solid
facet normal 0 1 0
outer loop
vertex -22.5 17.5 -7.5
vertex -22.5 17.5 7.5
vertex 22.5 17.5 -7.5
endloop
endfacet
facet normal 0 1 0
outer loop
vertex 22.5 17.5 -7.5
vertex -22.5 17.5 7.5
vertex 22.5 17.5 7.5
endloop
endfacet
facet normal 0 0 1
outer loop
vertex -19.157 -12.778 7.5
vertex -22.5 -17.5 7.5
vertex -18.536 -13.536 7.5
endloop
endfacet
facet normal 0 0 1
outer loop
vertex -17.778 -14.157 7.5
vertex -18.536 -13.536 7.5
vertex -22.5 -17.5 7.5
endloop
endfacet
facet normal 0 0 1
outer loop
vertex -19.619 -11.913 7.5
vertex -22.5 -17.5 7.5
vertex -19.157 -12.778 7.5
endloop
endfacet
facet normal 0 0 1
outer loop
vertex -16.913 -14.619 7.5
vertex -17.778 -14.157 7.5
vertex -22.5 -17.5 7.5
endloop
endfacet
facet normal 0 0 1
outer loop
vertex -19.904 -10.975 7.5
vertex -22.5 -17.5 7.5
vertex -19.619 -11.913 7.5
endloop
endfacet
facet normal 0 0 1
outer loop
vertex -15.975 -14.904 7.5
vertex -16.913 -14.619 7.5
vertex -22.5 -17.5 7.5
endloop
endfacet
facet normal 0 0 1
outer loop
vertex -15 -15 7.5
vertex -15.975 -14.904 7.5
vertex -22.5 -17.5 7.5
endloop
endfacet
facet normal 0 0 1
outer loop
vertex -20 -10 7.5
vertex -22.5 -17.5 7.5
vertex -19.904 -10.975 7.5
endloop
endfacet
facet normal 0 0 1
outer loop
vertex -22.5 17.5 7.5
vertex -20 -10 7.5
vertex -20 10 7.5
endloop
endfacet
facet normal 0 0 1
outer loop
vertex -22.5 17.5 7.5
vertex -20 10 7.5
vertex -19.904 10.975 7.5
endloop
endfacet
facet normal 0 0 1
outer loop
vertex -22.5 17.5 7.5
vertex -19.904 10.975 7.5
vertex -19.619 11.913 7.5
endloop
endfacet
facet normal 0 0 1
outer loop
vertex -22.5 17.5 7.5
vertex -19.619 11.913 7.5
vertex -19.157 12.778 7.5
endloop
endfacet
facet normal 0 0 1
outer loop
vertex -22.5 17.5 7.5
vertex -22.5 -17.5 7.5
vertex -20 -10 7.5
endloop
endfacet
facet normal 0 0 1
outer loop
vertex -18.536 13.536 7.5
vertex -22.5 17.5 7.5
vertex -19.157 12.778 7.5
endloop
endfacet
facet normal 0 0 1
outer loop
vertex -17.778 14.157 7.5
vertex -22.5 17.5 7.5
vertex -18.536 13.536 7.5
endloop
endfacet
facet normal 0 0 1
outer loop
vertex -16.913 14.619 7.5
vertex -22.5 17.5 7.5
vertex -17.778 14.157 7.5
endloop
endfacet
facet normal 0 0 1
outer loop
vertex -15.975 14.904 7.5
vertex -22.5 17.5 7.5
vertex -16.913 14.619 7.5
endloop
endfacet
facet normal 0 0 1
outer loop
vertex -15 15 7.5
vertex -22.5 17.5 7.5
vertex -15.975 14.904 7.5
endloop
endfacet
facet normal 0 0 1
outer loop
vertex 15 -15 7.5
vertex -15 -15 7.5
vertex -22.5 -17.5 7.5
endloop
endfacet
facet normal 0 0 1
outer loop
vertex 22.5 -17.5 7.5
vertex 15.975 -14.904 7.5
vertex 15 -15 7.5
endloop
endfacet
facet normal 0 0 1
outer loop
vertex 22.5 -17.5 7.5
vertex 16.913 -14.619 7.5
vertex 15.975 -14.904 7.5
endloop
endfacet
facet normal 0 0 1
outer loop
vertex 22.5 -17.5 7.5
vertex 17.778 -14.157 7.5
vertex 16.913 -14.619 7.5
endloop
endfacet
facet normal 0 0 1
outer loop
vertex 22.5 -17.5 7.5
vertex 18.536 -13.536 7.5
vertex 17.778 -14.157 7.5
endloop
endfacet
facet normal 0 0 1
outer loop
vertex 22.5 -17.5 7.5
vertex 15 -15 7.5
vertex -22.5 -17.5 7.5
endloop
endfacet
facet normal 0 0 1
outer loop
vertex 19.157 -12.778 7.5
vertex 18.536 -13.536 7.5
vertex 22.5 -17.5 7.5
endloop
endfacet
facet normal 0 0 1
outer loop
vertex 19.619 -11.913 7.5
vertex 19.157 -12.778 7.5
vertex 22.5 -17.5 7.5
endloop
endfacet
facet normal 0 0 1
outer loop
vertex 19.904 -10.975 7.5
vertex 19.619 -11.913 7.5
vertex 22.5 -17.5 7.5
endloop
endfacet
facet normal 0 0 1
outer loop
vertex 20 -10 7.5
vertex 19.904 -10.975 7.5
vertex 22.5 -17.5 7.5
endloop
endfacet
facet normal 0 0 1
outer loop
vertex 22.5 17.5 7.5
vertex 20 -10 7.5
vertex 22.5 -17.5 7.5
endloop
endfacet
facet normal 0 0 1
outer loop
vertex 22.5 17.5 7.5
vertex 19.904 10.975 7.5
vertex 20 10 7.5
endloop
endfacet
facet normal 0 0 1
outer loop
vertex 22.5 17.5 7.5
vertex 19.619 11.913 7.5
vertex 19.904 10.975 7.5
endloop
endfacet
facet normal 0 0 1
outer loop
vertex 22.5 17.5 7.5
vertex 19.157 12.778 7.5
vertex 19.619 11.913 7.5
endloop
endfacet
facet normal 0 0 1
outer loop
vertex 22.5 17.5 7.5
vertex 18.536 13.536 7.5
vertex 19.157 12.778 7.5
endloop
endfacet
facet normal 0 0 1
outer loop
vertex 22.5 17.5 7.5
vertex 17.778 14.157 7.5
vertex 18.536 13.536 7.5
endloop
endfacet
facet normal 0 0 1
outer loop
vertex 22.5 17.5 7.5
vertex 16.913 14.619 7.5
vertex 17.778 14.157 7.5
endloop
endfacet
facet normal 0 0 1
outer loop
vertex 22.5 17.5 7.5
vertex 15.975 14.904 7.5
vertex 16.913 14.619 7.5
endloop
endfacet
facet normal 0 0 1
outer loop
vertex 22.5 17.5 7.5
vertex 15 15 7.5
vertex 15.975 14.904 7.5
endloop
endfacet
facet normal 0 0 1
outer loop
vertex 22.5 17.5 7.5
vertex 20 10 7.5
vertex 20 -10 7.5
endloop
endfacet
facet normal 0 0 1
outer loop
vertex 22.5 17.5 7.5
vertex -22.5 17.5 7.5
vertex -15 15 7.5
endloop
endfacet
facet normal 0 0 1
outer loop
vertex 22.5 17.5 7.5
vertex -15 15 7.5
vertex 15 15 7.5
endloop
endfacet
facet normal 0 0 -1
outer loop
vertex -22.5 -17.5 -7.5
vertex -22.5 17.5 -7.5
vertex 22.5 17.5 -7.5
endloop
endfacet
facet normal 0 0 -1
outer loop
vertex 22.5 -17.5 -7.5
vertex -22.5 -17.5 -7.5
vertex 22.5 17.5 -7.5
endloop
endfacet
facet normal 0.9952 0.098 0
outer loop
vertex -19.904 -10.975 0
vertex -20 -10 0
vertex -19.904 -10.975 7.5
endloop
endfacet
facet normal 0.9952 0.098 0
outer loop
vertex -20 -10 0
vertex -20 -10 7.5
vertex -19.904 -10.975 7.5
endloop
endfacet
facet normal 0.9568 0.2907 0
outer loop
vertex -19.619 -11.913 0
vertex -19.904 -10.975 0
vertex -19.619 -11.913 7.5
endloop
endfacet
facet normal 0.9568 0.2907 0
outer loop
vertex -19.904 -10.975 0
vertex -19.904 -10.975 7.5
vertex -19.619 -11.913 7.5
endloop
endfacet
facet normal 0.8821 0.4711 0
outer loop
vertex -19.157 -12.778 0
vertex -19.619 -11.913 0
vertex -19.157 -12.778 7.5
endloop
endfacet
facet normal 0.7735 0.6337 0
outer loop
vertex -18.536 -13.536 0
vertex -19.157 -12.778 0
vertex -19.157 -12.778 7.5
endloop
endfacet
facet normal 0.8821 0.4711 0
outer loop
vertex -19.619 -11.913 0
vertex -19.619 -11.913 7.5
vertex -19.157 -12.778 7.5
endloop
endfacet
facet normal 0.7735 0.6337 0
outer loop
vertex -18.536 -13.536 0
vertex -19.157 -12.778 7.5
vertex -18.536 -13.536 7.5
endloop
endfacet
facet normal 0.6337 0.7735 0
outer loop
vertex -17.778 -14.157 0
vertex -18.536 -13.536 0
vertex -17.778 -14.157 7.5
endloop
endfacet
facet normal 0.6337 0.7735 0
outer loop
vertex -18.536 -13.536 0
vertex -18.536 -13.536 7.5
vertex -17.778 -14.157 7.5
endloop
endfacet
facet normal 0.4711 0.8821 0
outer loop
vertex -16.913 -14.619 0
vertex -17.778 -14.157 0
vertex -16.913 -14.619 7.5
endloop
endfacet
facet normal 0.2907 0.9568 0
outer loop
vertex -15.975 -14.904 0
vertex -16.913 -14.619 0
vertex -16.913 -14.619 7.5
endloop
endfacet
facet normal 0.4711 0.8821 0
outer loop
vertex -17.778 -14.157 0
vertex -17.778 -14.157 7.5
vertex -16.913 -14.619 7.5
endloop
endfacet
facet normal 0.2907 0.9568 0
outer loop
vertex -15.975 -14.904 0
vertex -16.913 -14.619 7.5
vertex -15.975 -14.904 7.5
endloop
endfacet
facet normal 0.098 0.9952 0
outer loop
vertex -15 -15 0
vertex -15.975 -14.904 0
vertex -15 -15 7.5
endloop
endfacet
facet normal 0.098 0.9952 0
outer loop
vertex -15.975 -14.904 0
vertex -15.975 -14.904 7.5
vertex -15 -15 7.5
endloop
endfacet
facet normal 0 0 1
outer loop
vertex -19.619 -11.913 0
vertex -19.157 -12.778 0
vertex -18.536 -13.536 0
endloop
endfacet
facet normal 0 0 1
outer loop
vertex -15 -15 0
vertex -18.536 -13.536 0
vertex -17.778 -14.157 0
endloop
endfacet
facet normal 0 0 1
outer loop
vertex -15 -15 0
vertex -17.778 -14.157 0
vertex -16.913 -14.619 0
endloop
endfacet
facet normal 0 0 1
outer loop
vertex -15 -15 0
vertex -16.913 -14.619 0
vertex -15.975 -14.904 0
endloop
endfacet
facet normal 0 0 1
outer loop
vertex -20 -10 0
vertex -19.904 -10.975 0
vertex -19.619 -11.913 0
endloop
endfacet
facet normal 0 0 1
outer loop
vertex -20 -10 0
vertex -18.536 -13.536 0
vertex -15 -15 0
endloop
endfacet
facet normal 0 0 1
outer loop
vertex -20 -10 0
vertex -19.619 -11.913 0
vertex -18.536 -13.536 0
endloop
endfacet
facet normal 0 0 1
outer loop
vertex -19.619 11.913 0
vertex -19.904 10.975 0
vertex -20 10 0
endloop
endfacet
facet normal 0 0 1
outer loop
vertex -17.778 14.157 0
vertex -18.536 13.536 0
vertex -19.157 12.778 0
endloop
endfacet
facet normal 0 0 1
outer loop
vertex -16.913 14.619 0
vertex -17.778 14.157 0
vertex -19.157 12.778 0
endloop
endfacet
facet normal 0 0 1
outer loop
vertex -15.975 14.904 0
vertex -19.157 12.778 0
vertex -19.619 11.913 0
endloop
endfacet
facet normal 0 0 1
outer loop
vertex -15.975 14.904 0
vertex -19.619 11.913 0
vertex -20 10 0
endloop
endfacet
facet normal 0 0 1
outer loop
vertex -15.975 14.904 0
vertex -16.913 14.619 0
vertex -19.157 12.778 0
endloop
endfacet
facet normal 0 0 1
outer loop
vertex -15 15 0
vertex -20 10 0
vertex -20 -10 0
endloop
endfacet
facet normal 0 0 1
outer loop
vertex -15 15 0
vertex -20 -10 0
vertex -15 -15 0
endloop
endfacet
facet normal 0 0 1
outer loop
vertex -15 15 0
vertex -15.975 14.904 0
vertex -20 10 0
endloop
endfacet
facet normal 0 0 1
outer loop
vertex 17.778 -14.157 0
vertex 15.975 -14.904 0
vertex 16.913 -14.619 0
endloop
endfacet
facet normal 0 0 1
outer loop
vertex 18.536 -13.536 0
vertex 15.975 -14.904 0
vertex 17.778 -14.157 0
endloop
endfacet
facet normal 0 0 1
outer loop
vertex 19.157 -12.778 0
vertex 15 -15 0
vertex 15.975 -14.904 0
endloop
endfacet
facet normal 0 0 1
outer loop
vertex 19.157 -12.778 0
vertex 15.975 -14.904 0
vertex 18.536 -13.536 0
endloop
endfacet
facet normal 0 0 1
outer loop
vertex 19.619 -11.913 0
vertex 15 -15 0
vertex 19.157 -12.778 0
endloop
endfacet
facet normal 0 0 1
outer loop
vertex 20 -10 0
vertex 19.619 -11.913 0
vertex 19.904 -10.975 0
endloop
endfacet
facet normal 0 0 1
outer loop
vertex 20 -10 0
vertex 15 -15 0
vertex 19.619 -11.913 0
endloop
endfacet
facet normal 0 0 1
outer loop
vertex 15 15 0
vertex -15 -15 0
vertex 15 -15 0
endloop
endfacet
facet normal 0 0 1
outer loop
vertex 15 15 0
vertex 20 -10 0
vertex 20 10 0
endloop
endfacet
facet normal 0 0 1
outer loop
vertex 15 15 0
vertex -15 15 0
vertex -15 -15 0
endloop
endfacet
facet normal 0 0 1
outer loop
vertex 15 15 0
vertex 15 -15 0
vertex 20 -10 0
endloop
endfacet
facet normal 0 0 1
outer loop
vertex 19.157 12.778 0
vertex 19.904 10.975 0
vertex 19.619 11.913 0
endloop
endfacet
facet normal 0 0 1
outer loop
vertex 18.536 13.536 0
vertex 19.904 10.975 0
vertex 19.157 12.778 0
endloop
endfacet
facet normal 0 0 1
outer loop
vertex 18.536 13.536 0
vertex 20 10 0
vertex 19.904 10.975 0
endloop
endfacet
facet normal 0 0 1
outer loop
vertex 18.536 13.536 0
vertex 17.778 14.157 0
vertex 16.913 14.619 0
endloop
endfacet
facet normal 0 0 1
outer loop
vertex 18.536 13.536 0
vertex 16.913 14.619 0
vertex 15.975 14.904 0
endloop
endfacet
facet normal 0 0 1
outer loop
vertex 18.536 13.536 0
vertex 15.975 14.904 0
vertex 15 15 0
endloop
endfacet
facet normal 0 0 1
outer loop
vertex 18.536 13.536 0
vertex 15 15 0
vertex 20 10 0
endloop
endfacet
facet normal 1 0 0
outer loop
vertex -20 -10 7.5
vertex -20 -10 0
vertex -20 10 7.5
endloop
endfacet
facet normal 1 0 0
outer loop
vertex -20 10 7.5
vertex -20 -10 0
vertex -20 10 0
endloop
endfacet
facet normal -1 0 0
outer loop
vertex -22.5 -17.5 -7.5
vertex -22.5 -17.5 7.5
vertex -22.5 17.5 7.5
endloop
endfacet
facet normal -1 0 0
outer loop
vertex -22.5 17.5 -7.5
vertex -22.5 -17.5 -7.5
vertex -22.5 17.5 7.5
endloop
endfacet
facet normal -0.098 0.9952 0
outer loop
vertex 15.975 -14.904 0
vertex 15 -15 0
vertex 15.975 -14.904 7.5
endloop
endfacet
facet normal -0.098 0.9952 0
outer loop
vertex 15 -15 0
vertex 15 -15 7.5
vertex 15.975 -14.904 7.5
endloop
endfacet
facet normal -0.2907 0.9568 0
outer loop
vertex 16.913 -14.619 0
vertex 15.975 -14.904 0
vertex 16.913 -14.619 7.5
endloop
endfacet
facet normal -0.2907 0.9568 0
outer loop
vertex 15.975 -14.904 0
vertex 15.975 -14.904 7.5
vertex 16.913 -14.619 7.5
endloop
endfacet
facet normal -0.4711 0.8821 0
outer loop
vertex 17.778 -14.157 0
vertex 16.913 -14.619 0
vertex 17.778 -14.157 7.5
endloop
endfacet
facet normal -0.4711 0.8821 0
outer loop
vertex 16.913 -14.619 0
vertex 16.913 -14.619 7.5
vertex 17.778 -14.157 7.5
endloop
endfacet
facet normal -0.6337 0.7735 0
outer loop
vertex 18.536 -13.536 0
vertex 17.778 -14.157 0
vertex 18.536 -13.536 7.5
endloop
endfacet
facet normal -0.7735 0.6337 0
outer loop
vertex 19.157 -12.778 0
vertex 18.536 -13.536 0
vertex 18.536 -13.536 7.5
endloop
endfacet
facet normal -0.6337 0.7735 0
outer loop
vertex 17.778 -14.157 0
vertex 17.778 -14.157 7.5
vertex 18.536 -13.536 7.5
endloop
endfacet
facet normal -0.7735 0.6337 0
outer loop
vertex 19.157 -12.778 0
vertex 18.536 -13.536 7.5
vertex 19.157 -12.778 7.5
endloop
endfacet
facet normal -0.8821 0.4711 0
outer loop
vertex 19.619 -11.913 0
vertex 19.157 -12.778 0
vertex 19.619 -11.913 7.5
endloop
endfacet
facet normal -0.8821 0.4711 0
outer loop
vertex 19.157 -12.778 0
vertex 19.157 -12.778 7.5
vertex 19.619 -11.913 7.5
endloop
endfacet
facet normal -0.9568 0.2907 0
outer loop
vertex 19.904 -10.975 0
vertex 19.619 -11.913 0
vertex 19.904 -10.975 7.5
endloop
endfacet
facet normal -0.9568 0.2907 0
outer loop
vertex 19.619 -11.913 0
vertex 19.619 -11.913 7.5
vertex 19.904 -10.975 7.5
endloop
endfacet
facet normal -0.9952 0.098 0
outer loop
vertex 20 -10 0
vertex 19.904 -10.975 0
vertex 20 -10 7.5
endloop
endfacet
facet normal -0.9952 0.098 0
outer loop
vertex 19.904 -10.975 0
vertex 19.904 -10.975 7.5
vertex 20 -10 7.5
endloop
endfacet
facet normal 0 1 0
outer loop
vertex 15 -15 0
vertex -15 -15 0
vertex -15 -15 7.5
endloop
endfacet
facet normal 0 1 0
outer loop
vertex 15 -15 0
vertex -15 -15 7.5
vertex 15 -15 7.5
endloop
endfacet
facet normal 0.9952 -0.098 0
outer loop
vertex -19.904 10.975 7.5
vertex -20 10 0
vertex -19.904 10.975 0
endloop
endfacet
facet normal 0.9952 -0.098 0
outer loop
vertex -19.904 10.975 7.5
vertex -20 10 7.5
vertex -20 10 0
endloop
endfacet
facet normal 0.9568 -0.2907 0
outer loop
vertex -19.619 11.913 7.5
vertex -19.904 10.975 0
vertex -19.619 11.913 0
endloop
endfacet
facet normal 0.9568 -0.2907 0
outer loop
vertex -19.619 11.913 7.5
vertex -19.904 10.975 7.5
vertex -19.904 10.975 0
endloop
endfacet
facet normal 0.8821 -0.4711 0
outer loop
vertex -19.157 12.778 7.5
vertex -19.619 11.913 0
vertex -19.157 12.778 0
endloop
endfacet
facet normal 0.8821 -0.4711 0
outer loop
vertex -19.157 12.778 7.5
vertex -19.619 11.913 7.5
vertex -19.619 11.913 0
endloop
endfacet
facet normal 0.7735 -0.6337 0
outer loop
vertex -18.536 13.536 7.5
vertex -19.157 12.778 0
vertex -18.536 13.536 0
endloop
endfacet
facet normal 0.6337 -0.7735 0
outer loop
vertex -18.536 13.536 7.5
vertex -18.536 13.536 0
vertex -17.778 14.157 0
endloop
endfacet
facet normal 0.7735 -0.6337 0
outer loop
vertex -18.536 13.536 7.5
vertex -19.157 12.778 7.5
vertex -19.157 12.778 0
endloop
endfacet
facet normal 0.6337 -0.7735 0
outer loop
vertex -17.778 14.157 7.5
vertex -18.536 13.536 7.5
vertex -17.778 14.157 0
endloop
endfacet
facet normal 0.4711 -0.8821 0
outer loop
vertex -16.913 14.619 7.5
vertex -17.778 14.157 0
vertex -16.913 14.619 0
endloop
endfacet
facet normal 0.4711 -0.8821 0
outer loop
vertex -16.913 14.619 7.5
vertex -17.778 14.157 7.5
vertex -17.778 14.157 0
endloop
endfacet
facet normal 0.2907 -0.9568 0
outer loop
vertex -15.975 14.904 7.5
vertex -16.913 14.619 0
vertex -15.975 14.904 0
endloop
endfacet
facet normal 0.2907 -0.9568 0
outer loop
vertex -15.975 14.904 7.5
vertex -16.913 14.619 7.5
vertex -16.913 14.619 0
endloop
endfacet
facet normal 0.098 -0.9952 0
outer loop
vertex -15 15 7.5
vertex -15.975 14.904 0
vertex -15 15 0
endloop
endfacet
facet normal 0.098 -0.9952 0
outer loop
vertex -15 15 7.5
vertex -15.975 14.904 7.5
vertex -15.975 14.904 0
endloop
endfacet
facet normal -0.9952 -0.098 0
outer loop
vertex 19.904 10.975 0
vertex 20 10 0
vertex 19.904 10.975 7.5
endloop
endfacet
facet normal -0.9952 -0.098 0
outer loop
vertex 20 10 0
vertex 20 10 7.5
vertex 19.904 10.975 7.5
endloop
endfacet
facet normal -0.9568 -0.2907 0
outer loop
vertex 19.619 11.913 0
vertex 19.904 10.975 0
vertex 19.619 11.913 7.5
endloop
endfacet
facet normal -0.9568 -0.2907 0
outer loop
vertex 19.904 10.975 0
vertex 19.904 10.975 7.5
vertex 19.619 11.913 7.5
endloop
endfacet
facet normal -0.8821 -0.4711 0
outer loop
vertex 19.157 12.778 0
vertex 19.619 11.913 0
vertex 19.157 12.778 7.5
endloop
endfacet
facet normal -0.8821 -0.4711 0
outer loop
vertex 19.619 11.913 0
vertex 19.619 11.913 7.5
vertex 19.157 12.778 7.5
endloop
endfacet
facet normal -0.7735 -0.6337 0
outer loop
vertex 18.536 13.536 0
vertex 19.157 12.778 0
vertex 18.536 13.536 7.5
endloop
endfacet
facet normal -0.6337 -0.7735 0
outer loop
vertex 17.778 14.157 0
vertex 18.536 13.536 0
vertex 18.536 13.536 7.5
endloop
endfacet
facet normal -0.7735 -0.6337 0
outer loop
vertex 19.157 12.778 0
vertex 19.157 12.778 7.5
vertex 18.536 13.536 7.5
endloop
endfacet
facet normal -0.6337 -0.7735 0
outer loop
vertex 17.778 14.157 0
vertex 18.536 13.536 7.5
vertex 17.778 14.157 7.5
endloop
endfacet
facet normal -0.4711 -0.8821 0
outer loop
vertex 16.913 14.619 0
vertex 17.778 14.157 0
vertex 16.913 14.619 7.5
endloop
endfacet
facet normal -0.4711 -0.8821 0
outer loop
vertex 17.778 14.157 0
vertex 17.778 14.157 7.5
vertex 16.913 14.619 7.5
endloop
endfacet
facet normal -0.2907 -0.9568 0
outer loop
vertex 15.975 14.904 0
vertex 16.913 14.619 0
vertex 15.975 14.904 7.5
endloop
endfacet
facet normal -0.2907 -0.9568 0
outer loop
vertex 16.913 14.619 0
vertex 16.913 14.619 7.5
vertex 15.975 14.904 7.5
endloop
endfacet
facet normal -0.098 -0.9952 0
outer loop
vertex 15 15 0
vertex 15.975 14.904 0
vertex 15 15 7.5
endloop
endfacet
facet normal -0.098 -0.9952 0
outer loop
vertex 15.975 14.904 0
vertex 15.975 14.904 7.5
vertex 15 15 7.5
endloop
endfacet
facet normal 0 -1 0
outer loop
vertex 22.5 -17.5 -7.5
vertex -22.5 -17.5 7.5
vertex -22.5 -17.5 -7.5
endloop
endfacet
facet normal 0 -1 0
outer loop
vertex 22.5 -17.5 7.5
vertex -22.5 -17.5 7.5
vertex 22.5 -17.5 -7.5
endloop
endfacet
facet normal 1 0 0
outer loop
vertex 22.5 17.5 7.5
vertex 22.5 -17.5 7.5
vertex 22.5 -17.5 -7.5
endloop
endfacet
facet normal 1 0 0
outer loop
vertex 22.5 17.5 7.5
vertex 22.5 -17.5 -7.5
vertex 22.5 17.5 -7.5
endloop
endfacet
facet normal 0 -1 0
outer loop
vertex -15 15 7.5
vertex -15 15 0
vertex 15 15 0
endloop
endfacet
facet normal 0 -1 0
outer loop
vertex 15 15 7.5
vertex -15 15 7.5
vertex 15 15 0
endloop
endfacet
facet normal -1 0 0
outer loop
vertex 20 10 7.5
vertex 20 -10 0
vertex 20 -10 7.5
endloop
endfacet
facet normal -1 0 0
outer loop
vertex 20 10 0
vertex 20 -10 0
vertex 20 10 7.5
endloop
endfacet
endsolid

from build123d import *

# Parameters (mm, degrees)
F0_W     = 45
F0_H     = 35
F1_DEPTH = 7.5
F2_W     = 40
F2_H     = 30
F3_DEPTH = 7.5
F4_W     = 40
F4_H     = 30
F5_DEPTH = 5
F6_R     = 5


with BuildPart() as f1:
    # F0 (on Top) → F1 (new body, symmetric)
    with BuildSketch(Plane.XY):
        Rectangle(F0_W, F0_H)
    extrude(amount=F1_DEPTH, both=True)

    # F2 (on Top) → F3 (cut)
    with BuildSketch(Plane.XY):
        Rectangle(F2_W, F2_H)
    extrude(amount=F3_DEPTH, mode=Mode.SUBTRACT)

    # F4 (on Top) → F5 (join)
    with BuildSketch(Plane.XY):
        Rectangle(F4_W, F4_H)
    extrude(amount=-F5_DEPTH)

    # F6
    f6_edges = [f1.edges().sort_by_distance(p)[0] for p in [
        (20, 15, 3.75),
        (-20, 15, 3.75),
        (-20, -15, 3.75),
        (20, -15, 3.75),
    ]]
    fillet(f6_edges, radius=F6_R)


solid = f1.part
